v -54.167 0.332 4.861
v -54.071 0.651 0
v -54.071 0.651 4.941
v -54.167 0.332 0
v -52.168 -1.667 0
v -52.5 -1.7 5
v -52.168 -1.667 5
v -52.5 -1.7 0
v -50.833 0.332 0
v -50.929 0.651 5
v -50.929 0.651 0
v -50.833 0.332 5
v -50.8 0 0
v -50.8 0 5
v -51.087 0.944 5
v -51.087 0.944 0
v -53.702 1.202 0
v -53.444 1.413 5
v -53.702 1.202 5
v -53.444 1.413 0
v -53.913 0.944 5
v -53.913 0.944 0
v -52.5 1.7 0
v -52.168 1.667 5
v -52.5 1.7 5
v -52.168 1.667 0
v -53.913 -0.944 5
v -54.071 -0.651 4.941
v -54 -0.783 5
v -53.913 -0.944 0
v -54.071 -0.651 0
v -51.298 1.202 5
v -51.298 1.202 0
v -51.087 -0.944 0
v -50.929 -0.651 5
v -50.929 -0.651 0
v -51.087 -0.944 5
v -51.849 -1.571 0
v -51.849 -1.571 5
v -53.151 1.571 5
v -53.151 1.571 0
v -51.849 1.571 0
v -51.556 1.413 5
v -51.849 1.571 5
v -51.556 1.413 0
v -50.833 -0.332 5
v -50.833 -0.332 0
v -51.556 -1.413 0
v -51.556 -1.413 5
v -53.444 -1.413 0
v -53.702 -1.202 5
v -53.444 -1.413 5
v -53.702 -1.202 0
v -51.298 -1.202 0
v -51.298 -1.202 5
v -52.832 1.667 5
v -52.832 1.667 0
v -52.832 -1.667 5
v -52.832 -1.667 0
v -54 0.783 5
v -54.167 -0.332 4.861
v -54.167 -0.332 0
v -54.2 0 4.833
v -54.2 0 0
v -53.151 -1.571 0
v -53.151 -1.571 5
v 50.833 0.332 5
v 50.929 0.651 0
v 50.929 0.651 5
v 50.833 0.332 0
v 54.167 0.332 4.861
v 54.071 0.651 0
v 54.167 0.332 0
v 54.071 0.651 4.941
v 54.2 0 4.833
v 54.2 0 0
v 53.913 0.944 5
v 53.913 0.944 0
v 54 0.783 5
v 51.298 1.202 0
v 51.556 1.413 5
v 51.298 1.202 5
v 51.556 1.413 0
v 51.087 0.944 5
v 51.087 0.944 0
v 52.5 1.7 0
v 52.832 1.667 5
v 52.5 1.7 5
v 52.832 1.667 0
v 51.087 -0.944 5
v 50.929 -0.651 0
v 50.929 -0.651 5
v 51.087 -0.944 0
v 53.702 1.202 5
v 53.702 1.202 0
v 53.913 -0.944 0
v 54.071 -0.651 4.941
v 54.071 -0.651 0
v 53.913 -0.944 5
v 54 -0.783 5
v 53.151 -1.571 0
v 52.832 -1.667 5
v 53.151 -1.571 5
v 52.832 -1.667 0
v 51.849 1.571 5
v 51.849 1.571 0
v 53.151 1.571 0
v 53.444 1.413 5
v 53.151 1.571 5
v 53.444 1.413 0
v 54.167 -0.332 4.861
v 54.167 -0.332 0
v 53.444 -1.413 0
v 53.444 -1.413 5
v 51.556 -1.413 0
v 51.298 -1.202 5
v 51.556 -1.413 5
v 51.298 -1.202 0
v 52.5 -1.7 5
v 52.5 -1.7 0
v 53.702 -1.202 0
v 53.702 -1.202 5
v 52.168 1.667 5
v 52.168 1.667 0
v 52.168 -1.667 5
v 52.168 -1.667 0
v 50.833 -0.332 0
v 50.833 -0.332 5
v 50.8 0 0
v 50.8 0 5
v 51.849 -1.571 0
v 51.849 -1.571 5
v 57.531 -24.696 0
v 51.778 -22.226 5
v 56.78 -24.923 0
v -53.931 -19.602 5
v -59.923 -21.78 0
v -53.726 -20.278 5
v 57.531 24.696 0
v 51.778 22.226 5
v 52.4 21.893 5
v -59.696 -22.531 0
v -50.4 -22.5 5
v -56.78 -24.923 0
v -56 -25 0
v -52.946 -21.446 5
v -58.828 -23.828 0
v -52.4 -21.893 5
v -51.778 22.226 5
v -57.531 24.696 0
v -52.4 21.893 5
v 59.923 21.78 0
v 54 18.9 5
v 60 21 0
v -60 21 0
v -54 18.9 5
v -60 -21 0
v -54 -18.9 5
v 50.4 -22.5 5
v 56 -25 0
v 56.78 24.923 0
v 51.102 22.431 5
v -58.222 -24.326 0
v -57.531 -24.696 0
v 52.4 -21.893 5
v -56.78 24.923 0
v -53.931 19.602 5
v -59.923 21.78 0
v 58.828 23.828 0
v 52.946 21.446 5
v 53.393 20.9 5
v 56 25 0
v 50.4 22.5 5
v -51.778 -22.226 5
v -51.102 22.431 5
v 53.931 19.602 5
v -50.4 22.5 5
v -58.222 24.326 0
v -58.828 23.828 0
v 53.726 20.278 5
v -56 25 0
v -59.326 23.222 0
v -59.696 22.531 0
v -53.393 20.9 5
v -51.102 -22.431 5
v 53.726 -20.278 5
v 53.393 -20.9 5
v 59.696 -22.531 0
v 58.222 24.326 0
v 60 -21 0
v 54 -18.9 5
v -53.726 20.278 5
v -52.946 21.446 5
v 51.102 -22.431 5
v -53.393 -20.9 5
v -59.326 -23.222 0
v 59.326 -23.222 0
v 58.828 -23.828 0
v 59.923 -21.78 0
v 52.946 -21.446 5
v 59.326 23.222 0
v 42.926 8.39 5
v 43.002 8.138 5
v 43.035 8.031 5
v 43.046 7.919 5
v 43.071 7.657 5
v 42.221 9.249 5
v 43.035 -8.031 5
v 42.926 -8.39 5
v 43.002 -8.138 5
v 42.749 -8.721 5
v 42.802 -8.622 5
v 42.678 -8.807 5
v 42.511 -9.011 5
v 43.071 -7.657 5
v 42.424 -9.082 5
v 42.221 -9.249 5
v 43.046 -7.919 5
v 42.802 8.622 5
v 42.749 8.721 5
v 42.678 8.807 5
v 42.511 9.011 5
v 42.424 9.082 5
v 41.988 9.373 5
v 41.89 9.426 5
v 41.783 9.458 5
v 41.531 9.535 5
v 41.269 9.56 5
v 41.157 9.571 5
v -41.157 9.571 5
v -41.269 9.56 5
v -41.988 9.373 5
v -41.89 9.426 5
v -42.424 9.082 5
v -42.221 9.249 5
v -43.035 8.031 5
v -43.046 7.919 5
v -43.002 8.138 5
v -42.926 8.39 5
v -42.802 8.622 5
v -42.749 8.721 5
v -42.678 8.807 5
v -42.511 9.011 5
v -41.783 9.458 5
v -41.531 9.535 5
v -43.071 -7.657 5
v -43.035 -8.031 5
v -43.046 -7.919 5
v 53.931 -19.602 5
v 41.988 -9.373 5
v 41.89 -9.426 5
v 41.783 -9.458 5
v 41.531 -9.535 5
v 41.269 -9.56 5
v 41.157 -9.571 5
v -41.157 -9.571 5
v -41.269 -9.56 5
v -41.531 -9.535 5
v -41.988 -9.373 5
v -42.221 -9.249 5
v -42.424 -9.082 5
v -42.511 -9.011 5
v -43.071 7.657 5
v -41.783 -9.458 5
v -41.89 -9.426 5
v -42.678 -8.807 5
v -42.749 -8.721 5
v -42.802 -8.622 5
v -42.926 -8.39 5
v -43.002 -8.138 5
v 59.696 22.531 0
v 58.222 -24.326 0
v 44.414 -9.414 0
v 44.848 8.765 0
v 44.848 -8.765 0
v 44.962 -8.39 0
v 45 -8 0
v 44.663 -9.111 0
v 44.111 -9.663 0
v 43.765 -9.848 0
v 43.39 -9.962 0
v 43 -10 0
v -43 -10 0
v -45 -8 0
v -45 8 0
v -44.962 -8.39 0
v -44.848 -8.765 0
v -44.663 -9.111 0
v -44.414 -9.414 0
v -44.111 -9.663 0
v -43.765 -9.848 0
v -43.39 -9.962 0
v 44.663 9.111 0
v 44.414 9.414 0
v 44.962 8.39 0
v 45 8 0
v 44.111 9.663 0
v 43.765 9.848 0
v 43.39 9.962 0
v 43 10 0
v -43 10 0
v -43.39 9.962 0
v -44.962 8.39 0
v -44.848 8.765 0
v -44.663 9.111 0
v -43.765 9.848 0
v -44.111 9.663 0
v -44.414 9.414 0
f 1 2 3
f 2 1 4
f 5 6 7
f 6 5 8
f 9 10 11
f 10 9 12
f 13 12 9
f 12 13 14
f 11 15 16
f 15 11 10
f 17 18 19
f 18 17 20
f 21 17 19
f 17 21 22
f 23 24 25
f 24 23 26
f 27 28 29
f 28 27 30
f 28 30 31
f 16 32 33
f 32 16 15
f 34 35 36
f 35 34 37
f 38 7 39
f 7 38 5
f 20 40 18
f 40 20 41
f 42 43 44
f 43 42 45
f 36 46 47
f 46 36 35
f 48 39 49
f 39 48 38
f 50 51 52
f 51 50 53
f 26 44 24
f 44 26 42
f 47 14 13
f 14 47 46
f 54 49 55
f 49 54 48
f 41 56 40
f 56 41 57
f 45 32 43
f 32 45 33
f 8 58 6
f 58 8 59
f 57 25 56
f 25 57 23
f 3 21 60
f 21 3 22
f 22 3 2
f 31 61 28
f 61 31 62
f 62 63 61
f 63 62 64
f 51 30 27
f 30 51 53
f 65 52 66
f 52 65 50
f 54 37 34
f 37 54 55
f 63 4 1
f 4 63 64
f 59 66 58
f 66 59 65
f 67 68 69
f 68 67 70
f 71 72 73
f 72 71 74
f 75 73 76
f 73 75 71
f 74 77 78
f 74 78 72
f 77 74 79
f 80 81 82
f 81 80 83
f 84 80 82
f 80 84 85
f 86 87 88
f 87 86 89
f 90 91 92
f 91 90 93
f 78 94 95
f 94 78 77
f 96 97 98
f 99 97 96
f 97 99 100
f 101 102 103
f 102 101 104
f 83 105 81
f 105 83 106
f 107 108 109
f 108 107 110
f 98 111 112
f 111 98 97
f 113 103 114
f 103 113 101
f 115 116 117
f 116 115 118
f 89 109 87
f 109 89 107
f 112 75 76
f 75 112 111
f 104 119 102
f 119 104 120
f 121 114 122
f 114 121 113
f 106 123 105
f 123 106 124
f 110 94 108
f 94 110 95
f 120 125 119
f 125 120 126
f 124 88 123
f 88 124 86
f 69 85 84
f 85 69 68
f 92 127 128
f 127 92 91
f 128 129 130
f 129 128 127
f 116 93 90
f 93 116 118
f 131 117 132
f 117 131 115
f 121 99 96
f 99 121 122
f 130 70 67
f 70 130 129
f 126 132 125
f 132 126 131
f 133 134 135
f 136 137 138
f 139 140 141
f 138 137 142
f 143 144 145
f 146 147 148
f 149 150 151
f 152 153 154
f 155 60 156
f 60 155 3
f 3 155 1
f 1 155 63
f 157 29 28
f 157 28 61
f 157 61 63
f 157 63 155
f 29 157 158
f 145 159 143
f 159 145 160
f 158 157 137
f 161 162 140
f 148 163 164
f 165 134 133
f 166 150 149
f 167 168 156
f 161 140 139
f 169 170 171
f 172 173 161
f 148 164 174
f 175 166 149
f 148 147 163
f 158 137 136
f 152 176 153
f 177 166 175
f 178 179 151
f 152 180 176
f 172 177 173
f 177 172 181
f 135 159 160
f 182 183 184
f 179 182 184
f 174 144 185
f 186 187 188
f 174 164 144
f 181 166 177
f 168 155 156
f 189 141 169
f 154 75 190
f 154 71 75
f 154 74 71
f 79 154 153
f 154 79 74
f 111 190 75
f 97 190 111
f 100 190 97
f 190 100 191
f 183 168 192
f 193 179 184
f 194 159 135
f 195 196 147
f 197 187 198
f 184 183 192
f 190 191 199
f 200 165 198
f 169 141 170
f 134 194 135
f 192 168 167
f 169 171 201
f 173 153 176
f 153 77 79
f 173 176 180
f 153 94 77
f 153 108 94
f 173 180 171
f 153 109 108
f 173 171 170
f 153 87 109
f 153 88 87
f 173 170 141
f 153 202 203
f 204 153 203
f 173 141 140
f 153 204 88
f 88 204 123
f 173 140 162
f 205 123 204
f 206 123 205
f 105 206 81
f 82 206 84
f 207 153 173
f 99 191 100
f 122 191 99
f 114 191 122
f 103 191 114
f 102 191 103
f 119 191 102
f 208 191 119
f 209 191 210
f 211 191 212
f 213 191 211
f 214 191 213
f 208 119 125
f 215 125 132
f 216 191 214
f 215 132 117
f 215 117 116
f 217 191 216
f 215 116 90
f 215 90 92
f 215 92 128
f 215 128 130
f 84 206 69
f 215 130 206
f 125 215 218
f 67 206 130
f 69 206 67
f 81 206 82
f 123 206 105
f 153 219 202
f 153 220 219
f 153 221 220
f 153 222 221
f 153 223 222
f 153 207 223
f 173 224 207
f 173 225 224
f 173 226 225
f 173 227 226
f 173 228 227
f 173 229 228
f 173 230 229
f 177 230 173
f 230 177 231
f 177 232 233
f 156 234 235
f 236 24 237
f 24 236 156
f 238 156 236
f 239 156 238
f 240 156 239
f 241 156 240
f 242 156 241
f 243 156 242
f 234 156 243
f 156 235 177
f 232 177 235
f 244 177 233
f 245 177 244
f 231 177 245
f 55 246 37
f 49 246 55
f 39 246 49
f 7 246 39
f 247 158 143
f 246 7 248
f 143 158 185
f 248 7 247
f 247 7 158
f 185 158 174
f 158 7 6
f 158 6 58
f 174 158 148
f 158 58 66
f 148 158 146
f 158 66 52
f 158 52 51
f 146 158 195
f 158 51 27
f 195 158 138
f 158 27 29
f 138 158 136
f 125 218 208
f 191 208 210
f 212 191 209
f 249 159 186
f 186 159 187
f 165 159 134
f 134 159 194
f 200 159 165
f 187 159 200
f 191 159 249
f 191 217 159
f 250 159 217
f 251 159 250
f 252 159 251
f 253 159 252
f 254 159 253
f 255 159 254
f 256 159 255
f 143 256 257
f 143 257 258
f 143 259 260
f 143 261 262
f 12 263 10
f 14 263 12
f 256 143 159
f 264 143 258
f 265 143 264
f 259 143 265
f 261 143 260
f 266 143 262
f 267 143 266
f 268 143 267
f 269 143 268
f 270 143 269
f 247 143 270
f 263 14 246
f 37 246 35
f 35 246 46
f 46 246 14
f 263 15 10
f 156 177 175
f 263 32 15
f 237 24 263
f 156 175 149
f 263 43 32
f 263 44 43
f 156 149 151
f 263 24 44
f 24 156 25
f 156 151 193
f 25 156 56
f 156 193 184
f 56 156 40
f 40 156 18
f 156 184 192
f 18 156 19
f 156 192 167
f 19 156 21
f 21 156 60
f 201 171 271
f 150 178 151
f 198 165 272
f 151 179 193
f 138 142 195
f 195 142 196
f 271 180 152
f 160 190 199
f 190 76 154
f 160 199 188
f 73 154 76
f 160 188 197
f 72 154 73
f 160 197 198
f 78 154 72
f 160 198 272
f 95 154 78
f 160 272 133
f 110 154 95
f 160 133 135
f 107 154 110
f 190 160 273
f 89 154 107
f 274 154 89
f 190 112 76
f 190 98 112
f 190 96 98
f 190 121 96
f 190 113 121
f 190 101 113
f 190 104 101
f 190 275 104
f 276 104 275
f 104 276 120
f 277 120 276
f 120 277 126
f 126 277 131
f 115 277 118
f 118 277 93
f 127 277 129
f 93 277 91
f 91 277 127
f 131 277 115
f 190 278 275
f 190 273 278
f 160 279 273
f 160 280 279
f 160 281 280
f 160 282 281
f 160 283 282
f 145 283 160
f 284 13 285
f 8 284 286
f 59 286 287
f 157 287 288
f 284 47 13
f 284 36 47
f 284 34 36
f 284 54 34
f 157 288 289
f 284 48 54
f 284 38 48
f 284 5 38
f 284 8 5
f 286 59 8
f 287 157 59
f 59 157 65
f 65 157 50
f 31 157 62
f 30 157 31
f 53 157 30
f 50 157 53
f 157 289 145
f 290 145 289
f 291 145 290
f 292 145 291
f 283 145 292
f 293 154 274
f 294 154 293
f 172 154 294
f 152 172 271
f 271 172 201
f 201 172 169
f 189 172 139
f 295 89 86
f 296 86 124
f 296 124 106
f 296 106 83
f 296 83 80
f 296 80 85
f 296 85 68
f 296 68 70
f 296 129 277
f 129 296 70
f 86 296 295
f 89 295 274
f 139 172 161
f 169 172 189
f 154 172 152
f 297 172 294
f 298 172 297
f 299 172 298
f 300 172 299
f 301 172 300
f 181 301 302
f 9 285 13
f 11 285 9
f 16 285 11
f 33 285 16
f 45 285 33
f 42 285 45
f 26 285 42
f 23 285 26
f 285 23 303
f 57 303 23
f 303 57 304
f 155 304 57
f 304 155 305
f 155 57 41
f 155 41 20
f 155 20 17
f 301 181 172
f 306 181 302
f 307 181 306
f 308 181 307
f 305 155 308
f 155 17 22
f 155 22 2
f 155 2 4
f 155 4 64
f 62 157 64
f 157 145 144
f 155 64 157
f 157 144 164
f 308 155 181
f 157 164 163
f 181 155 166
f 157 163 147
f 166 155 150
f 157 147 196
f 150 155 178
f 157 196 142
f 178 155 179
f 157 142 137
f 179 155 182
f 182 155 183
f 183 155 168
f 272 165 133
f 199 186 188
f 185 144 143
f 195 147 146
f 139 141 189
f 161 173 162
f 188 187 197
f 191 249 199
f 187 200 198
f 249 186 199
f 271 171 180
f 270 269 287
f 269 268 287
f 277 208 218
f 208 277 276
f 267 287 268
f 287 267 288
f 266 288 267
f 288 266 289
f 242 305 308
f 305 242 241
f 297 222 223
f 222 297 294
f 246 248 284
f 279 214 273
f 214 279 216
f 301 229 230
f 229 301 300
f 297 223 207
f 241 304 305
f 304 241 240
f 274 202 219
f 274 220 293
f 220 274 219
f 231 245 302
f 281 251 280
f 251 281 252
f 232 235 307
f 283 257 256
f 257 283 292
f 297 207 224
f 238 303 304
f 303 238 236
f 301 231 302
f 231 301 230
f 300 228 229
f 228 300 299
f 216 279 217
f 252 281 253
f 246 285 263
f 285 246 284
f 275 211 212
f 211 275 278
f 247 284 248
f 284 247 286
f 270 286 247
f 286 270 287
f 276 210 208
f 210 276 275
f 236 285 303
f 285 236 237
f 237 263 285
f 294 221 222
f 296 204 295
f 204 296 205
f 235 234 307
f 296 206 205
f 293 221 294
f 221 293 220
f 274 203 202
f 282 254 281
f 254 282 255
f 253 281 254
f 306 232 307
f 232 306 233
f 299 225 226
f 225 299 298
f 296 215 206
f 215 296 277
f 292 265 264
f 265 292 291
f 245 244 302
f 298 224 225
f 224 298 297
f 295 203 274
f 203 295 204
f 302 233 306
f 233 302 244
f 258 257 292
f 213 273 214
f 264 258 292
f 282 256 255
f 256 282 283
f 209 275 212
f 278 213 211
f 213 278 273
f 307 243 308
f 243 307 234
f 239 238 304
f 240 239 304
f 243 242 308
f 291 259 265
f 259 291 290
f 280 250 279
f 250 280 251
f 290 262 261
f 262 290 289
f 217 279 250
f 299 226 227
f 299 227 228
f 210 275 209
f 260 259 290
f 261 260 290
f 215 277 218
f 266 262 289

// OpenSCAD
$fn = 32;

// ----------------------------------------------------------------------
// Display bezel: 120 x 50 mm frame, opening 90x20 mm
// ----------------------------------------------------------------------

// --- parameters (mm) ---
length = 120;             // frame outside length, X
width = 50;               // frame outside width, Y
frame_w = 15;             // frame width
thickness = 5;            // frame thickness
corner_r = 4;             // outside corner radius
chamfer = 0.9;            // outer wall taper
funnel = 0.94;            // inner opening taper
opening_l = 90;           // opening length
opening_w = 20;           // opening width
inner_r = 2;              // opening corner radius
hole_d = 3.4;             // mounting screw clearance
holes_per_side = 1;       // holes per short side
hole_inset = 7.5;         // hole centre inset from the outside edge

/* rounded-rectangle outlines, generated with loops */
module rounded_ring(l_nom, w_nom, r) {
  hull() {
    for (sx = [-1, 1]) for (sy = [-1, 1])
      translate([sx * (l_nom / 2 - r), sy * (w_nom / 2 - r)]) circle(r = r);
  }
}

difference() {
  /* frame body, drafted so the outer edge is a variable-depth chamfer */
  linear_extrude(height = thickness, scale = chamfer)
    rounded_ring(length, width, corner_r);
  /* viewing opening, drafted the other way for a funnel edge */
  linear_extrude(height = thickness + 2, scale = funnel)
    translate([0, 0, -1]) rounded_ring(opening_l, opening_w, inner_r);
  /* mounting screws through the frame lands */
  for (sx = [-1, 1]) for (i = [1 : holes_per_side])
    translate([sx * (length / 2 - hole_inset),
               (i - (holes_per_side + 1) / 2) * width * 0.5, -1])
      cylinder(h = thickness + 2, d = hole_d);
}
